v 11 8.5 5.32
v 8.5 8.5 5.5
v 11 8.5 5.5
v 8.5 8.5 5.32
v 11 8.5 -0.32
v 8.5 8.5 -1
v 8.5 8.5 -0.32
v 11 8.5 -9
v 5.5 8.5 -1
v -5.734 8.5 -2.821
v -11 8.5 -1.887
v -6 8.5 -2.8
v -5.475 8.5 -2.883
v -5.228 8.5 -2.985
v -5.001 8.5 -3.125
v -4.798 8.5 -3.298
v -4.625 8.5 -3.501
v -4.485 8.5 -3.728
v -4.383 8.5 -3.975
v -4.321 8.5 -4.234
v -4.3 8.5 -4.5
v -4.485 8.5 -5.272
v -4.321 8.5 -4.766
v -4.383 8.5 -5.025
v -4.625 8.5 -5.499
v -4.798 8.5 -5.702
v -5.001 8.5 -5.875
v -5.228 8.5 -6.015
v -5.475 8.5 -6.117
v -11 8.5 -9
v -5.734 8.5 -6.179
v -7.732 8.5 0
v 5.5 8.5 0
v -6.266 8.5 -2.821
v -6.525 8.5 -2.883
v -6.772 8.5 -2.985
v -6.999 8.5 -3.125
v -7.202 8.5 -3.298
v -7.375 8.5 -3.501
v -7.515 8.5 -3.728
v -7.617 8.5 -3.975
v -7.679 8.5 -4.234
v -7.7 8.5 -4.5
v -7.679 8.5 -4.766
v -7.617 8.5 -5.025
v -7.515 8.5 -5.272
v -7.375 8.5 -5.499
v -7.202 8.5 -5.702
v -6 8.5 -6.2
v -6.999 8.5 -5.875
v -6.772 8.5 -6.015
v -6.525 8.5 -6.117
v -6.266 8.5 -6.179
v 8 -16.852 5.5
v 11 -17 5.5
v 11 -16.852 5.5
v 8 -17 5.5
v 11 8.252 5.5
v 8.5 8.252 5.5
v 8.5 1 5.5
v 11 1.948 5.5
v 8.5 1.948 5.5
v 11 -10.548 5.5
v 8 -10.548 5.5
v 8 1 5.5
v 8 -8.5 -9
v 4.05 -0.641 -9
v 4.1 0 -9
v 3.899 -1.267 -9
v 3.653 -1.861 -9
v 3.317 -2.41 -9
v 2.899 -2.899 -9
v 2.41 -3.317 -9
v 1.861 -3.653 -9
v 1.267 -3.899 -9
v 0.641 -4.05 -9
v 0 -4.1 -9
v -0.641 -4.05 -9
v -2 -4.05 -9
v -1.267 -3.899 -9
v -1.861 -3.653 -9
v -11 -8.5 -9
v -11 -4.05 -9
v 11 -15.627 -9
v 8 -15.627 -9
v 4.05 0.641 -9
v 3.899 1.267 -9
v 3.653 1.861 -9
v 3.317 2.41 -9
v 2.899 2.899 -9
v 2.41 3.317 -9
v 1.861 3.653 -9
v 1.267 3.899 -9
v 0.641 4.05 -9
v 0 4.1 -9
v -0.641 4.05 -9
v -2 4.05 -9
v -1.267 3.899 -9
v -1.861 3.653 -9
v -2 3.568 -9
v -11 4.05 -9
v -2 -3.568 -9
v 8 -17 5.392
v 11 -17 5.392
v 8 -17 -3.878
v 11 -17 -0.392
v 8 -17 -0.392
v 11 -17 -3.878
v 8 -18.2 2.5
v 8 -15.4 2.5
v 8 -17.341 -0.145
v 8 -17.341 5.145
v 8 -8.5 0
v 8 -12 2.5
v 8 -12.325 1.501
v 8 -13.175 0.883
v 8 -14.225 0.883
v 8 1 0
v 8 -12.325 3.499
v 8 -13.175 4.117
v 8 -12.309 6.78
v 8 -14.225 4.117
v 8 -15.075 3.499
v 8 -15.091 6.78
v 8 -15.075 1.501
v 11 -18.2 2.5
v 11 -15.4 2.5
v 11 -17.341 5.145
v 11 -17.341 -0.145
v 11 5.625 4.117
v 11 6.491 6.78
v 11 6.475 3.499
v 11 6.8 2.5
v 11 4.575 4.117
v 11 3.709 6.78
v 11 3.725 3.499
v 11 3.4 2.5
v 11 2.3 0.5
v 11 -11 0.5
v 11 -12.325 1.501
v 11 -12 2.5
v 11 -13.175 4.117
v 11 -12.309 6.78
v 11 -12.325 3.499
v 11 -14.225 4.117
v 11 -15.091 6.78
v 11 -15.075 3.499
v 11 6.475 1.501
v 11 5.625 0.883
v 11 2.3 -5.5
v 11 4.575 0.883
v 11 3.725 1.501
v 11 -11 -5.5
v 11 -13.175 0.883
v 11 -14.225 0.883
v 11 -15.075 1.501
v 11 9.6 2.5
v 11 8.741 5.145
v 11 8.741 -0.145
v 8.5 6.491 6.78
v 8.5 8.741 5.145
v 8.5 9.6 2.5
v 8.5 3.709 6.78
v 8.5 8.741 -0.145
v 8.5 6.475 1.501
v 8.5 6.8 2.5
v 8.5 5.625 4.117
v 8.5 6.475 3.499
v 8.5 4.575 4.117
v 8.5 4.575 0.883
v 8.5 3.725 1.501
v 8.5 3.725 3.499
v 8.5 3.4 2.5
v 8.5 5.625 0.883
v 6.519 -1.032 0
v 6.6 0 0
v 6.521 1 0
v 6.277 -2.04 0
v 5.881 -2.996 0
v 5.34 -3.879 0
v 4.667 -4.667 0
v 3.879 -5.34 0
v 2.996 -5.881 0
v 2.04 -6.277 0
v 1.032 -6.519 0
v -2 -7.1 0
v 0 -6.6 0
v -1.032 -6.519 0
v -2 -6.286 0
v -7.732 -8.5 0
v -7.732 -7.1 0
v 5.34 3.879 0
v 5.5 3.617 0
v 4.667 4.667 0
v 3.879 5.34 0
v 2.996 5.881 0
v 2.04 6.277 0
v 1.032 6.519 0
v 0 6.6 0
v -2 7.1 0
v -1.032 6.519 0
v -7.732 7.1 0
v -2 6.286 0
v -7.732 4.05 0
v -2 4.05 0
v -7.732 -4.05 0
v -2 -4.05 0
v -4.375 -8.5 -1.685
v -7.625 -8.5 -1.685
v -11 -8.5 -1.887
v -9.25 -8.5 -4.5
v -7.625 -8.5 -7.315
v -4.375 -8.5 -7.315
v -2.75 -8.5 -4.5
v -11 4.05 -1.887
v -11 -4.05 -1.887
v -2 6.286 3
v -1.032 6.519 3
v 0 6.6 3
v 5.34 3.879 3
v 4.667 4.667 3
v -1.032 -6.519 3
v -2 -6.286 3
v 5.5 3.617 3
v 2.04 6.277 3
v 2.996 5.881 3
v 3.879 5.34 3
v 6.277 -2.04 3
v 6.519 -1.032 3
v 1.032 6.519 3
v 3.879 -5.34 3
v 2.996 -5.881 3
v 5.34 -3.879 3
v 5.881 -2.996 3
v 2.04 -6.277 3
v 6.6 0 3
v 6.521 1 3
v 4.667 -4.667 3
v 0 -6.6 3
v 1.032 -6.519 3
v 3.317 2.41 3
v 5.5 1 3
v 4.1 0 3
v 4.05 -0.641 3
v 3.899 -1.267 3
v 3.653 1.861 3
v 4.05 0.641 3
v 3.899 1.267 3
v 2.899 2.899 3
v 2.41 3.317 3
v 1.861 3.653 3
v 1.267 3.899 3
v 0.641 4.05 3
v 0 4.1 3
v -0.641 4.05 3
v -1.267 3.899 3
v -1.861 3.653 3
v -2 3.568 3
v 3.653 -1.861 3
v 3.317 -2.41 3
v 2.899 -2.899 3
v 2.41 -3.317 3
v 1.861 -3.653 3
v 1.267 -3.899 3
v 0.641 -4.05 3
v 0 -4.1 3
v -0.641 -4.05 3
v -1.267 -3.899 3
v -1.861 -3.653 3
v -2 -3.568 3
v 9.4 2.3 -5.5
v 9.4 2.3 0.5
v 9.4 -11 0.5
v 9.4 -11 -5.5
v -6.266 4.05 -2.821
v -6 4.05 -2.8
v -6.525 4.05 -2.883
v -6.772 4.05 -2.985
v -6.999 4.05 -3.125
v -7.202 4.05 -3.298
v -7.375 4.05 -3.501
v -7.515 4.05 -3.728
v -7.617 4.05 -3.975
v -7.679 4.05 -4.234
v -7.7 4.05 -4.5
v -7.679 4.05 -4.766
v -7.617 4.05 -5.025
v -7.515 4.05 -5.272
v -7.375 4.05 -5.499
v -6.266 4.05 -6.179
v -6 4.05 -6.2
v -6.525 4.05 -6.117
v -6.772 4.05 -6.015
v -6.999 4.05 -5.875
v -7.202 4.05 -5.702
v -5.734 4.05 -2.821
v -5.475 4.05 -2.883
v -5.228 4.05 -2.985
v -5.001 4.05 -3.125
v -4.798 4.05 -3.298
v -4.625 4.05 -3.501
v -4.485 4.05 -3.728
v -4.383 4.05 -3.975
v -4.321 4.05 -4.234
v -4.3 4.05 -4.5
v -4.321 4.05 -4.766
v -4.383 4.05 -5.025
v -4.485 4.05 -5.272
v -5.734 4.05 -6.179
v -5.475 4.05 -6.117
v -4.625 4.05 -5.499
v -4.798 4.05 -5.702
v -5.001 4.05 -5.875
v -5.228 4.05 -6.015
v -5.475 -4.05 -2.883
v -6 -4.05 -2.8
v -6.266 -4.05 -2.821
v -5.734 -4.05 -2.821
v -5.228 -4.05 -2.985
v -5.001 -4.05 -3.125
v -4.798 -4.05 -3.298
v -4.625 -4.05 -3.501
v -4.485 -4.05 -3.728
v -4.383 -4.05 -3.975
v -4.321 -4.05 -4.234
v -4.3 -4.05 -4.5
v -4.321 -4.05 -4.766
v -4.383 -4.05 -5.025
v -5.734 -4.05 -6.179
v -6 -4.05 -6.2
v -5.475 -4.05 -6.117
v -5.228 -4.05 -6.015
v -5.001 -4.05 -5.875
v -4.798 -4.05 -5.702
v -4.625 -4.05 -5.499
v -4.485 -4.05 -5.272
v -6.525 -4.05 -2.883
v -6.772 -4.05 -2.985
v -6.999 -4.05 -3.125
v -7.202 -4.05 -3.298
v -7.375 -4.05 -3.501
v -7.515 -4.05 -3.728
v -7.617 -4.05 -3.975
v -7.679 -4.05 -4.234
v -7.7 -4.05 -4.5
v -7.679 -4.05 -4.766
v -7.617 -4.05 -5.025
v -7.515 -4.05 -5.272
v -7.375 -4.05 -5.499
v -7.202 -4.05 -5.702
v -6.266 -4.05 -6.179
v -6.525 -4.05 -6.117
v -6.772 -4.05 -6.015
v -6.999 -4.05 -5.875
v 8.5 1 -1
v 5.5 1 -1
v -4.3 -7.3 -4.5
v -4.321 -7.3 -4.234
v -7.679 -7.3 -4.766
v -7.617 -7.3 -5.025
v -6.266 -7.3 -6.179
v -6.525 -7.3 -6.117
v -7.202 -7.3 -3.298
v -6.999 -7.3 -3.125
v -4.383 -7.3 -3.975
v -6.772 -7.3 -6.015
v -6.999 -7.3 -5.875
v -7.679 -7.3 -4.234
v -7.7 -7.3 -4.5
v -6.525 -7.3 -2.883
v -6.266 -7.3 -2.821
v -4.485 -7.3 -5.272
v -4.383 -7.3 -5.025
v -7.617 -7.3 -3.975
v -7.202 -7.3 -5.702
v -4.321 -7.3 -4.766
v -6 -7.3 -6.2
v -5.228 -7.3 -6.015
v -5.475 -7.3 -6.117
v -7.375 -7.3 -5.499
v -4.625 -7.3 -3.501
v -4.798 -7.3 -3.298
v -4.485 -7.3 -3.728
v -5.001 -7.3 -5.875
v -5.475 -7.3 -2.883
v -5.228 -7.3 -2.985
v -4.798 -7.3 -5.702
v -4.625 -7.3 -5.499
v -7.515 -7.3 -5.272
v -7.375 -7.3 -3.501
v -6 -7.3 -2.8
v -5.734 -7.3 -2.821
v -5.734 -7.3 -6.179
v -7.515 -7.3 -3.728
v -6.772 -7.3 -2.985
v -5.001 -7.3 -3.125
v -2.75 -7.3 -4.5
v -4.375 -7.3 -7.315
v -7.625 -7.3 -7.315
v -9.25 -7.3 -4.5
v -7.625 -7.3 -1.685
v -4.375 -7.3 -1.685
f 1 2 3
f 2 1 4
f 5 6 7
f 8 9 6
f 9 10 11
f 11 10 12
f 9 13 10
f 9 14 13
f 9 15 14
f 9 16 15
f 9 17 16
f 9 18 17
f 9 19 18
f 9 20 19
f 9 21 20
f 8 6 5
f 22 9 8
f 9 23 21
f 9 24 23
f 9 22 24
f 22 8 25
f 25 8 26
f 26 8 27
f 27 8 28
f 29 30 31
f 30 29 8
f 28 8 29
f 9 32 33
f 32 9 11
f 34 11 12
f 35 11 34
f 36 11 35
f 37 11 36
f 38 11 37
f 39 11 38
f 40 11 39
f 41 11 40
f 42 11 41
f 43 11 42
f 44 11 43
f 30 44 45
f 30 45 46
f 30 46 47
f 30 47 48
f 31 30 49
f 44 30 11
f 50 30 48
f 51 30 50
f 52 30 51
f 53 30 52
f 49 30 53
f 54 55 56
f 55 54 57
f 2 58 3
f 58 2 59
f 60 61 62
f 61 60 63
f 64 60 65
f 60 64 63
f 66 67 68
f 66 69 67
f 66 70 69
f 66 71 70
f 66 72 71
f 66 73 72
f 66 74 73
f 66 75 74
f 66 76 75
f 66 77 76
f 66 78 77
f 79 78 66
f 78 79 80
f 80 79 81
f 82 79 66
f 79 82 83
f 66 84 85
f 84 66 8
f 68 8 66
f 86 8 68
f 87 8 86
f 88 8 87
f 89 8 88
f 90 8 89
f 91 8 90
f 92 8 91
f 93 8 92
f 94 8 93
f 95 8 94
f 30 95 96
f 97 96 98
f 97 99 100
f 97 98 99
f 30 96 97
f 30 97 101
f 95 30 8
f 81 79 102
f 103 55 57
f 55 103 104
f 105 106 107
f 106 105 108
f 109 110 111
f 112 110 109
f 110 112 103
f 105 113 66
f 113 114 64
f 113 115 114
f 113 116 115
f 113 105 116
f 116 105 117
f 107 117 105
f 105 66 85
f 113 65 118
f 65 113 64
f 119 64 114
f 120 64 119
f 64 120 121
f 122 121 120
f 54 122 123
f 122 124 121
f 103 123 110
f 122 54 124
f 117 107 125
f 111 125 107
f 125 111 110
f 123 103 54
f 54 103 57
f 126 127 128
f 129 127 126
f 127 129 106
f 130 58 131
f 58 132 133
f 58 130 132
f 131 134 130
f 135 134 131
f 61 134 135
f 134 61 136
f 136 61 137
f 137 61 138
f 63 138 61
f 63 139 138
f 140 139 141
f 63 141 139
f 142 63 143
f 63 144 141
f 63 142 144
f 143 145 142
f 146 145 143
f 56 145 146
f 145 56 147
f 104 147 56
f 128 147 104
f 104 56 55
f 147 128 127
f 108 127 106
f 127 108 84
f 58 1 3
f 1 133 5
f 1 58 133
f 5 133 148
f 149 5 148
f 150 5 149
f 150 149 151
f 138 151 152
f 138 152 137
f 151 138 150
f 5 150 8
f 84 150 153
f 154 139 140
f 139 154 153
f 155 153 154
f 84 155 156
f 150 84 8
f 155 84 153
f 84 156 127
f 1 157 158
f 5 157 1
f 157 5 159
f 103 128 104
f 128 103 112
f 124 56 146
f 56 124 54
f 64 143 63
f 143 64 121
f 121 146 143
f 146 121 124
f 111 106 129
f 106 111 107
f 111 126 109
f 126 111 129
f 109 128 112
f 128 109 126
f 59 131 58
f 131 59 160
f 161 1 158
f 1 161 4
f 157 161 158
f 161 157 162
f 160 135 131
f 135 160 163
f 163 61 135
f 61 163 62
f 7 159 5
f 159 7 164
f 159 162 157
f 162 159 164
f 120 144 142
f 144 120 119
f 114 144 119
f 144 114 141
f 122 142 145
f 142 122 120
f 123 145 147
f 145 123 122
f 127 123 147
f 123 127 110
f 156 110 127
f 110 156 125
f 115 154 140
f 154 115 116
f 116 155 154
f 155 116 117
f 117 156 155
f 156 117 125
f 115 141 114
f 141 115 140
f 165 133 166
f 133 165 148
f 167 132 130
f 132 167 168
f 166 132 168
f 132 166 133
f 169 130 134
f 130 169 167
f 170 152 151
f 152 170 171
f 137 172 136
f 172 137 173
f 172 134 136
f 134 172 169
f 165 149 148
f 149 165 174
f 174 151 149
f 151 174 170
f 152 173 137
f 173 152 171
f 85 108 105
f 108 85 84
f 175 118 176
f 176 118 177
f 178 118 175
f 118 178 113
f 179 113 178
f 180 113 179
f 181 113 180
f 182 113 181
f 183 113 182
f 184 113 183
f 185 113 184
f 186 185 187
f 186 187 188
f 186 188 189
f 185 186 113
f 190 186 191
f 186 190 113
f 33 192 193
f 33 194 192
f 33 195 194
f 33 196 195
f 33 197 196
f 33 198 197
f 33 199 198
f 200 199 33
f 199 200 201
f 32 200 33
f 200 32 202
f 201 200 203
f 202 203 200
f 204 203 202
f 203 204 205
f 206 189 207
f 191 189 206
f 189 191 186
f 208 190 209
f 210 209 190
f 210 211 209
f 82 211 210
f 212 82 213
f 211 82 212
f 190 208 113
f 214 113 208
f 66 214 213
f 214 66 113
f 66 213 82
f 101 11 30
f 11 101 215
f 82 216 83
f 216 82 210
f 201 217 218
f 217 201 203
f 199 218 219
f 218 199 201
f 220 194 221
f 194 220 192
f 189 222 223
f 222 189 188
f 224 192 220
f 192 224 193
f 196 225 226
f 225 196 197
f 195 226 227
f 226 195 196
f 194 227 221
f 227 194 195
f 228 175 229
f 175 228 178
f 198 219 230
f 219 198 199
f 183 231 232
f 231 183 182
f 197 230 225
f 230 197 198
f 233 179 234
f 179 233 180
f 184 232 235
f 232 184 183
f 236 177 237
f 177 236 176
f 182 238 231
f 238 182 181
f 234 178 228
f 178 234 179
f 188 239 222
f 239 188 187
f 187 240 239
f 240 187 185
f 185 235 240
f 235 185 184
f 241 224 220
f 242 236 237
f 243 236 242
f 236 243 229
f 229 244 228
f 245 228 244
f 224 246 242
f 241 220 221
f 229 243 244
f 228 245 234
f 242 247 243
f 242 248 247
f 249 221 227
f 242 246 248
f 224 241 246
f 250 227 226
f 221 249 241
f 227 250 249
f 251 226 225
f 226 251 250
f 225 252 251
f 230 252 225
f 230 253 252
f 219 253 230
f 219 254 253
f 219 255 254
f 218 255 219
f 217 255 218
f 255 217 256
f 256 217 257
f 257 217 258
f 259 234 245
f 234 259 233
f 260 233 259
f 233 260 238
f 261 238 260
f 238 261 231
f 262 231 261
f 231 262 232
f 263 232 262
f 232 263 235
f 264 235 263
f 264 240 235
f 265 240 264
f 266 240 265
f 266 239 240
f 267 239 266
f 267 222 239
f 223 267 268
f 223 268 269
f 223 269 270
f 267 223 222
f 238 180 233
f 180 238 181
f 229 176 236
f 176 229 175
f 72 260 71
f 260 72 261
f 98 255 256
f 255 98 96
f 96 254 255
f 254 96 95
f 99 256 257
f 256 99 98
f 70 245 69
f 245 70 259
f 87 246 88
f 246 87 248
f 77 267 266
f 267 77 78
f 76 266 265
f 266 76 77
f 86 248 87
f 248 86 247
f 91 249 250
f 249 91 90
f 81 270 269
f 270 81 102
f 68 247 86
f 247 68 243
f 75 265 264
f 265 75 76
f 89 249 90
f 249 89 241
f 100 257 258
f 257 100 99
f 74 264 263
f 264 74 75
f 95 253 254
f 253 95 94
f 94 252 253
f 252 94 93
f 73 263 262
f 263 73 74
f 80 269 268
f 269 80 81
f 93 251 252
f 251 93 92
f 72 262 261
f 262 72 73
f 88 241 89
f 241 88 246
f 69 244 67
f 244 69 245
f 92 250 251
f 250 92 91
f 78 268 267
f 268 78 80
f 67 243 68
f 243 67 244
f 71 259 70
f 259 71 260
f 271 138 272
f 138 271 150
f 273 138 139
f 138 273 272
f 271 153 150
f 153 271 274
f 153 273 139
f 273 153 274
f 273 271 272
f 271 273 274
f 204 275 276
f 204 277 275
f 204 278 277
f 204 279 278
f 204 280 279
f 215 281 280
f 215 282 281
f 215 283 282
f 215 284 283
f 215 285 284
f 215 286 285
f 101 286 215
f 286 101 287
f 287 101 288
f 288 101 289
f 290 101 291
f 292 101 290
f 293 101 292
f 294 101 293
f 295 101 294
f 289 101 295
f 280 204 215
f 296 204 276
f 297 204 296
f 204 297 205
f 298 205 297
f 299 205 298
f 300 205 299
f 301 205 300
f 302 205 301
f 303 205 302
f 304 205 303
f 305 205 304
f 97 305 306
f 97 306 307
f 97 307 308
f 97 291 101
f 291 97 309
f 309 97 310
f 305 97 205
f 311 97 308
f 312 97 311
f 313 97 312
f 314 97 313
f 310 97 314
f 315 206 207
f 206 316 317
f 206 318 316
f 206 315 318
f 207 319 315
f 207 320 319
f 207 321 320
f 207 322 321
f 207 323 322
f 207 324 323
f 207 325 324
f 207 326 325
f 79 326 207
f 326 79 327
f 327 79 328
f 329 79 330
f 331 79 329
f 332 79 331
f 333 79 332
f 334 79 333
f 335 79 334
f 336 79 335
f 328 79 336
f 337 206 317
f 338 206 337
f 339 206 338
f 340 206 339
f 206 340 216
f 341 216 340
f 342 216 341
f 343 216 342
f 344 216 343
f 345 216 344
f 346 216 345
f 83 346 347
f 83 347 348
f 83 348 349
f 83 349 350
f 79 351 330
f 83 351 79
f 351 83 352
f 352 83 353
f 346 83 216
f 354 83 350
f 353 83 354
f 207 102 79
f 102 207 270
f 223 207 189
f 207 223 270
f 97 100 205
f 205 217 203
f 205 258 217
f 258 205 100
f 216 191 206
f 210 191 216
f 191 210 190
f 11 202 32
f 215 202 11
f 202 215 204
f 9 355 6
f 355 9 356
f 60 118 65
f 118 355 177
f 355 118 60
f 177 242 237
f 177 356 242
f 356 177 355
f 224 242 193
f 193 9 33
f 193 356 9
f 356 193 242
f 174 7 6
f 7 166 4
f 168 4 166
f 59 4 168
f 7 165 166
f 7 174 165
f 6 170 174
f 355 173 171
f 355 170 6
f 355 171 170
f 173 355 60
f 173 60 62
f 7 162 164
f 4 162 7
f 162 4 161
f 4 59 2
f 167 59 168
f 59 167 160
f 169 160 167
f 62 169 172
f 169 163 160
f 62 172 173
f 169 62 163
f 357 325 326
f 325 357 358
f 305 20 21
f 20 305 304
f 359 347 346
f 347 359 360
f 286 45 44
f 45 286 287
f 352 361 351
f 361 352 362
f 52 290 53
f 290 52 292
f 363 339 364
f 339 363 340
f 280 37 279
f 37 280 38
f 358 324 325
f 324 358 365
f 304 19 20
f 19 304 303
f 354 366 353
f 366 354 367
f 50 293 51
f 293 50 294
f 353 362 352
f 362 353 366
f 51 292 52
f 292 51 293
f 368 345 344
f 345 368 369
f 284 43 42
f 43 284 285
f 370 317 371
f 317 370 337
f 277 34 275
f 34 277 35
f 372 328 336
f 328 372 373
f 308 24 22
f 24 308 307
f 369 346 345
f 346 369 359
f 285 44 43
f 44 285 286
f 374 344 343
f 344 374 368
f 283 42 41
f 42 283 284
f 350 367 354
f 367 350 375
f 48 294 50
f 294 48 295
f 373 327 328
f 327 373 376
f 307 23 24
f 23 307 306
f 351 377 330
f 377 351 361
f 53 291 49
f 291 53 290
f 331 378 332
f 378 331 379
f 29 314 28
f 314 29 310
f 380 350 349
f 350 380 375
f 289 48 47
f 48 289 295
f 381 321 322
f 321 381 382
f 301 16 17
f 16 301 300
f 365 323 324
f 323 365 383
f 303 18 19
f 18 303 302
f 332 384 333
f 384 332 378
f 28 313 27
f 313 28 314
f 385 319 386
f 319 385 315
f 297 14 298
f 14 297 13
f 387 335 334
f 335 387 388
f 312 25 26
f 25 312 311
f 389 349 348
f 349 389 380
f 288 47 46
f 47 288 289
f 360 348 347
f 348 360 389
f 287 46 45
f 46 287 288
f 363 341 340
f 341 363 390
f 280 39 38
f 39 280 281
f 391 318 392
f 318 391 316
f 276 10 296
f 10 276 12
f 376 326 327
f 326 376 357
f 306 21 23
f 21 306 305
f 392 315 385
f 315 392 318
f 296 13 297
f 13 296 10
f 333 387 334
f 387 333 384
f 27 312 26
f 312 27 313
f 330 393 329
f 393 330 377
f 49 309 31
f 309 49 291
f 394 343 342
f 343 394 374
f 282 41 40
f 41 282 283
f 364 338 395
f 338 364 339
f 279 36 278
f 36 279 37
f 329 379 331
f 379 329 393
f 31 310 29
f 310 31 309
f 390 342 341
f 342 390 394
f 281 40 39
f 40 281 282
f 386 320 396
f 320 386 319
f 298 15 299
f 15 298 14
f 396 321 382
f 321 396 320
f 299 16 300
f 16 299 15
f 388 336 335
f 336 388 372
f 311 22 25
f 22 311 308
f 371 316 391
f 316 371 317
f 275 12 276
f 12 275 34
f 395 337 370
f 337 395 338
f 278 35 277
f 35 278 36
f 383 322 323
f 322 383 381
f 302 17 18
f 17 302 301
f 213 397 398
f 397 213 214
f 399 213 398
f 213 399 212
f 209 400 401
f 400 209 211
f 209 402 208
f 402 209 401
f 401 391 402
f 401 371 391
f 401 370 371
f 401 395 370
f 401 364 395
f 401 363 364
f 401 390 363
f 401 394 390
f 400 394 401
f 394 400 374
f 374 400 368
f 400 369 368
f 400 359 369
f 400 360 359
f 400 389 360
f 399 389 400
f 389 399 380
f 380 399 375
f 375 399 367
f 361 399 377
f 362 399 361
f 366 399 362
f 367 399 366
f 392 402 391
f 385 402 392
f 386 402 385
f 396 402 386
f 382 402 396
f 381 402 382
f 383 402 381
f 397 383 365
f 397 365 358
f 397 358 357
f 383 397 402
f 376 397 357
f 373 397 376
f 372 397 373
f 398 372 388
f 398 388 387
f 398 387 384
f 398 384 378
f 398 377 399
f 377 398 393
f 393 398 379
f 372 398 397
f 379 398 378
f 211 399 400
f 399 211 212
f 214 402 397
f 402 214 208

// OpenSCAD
//-- P3Steel / Prusa i3 Z-axis endstop holder
//-- by AndrewBCN - Barcelona, Spain - December 2014
//-- GPLV3
//-- from an original design by Stefaan Ponnet
//-- Thingiverse #64254

//-- designed to hold a makerbot-style mechanical endstop

//-- requires 2 x M3 8mm screws and 2 x M3 nyloc nuts

//-- designed specifically to be used with my improved
//-- P3Steel X-axis Motor End with adjustable Z endstop
//-- screw

//-- Parameters

tol=0.1;
$fn=40;
width = 17;
length=22;

switch_plate_length=2;
switch_plate_height=3;
overhang=8.5;
m3_diameter=3.4;
holder_hole_spacing=18.8;

//-- Modules

module makerbot_plate(mp_height=12.5) {
  difference() {
    union() {
      cube([width+overhang,3,mp_height]);
      // the two M3 holes below are very close to the edges of the cube so let's reinforce the edges
      translate([3.3,3,mp_height-3]) rotate([90, 0, 0]) cylinder(h=3,r=4.5, $fn = 10);
      translate([3.3+holder_hole_spacing,3,mp_height-3]) rotate([90, 0, 0]) cylinder(h=3,r=4.5, $fn = 10);
    }
    // two M3 holes
    translate([3.3,5,mp_height-3]) rotate([90, 0, 0]) cylinder(h =20, r = m3_diameter/2, $fn = 10);
    translate([3.3+holder_hole_spacing,5,mp_height-3]) rotate([90, 0, 0]) cylinder(h =20, r = m3_diameter/2, $fn = 10);
    // trim a little bit
    translate([-3,-5,-3]) rotate([0, -15, 0]) cube ([5,10,20]);
  }
}

module endstop_holder(ziptie_w=1.2,ziptie_h=4,height=8) {
  rotate([0,0,90])
  difference() {
    union() {
      translate([-width/2,-length/2,-height]) cube(size=[width,length,height]);
      // Surface that contacts the Makerbot mechanical endstop
      translate([-width/2-overhang,-length/2,-height]) makerbot_plate(height+5.5);
      // cone
      translate([0,0,-height]) cylinder(r=6.5+tol,h=height+switch_plate_height);
      // reinforce the part a little bit
      //translate([-width/2-tol,6,-height/2]) rotate([0,90,0]) rotate([0,0,30]) cylinder($fn=6,r=3.25,h=2);
    }   
    translate([0,0,-height-tol]) cylinder(r=4+tol,h=height+switch_plate_height+2*tol);
    
    translate([-width/2-overhang+6,-length/2-2.4,-5.5]) cube([13.3,4,6]);
    
    // klem gat
    translate([(-8-tol)/2,2,-height-tol]) cube(size=[8+tol,length/2+tol,height+2*tol]);

    // weggommen halve cirkel geleidingsbus
    translate([(-7-tol),2,0]) cube(size=[14+2*tol,12/2+tol,switch_plate_height+2*tol]);
    translate([-10,6,1]) rotate([-30,0,0]) cube(size=[20,10,switch_plate_height]);
    
    // get some space for nut
    translate([1,-8.5,-1]) cube(size=[10,3,10]);

    // schroefgat
    translate([-width/2-tol,6,-height/2]) rotate([0,90,0]) cylinder(r=1.5+tol*2,h=width+2*tol);
    translate([-width/2-tol,6,-height/2]) rotate([0,90,0]) rotate([0,0,30]) cylinder($fn=6,r=3.25,h=1.3);
  }
}

//-- Print the part
endstop_holder(1.5,5+tol*2,9);
